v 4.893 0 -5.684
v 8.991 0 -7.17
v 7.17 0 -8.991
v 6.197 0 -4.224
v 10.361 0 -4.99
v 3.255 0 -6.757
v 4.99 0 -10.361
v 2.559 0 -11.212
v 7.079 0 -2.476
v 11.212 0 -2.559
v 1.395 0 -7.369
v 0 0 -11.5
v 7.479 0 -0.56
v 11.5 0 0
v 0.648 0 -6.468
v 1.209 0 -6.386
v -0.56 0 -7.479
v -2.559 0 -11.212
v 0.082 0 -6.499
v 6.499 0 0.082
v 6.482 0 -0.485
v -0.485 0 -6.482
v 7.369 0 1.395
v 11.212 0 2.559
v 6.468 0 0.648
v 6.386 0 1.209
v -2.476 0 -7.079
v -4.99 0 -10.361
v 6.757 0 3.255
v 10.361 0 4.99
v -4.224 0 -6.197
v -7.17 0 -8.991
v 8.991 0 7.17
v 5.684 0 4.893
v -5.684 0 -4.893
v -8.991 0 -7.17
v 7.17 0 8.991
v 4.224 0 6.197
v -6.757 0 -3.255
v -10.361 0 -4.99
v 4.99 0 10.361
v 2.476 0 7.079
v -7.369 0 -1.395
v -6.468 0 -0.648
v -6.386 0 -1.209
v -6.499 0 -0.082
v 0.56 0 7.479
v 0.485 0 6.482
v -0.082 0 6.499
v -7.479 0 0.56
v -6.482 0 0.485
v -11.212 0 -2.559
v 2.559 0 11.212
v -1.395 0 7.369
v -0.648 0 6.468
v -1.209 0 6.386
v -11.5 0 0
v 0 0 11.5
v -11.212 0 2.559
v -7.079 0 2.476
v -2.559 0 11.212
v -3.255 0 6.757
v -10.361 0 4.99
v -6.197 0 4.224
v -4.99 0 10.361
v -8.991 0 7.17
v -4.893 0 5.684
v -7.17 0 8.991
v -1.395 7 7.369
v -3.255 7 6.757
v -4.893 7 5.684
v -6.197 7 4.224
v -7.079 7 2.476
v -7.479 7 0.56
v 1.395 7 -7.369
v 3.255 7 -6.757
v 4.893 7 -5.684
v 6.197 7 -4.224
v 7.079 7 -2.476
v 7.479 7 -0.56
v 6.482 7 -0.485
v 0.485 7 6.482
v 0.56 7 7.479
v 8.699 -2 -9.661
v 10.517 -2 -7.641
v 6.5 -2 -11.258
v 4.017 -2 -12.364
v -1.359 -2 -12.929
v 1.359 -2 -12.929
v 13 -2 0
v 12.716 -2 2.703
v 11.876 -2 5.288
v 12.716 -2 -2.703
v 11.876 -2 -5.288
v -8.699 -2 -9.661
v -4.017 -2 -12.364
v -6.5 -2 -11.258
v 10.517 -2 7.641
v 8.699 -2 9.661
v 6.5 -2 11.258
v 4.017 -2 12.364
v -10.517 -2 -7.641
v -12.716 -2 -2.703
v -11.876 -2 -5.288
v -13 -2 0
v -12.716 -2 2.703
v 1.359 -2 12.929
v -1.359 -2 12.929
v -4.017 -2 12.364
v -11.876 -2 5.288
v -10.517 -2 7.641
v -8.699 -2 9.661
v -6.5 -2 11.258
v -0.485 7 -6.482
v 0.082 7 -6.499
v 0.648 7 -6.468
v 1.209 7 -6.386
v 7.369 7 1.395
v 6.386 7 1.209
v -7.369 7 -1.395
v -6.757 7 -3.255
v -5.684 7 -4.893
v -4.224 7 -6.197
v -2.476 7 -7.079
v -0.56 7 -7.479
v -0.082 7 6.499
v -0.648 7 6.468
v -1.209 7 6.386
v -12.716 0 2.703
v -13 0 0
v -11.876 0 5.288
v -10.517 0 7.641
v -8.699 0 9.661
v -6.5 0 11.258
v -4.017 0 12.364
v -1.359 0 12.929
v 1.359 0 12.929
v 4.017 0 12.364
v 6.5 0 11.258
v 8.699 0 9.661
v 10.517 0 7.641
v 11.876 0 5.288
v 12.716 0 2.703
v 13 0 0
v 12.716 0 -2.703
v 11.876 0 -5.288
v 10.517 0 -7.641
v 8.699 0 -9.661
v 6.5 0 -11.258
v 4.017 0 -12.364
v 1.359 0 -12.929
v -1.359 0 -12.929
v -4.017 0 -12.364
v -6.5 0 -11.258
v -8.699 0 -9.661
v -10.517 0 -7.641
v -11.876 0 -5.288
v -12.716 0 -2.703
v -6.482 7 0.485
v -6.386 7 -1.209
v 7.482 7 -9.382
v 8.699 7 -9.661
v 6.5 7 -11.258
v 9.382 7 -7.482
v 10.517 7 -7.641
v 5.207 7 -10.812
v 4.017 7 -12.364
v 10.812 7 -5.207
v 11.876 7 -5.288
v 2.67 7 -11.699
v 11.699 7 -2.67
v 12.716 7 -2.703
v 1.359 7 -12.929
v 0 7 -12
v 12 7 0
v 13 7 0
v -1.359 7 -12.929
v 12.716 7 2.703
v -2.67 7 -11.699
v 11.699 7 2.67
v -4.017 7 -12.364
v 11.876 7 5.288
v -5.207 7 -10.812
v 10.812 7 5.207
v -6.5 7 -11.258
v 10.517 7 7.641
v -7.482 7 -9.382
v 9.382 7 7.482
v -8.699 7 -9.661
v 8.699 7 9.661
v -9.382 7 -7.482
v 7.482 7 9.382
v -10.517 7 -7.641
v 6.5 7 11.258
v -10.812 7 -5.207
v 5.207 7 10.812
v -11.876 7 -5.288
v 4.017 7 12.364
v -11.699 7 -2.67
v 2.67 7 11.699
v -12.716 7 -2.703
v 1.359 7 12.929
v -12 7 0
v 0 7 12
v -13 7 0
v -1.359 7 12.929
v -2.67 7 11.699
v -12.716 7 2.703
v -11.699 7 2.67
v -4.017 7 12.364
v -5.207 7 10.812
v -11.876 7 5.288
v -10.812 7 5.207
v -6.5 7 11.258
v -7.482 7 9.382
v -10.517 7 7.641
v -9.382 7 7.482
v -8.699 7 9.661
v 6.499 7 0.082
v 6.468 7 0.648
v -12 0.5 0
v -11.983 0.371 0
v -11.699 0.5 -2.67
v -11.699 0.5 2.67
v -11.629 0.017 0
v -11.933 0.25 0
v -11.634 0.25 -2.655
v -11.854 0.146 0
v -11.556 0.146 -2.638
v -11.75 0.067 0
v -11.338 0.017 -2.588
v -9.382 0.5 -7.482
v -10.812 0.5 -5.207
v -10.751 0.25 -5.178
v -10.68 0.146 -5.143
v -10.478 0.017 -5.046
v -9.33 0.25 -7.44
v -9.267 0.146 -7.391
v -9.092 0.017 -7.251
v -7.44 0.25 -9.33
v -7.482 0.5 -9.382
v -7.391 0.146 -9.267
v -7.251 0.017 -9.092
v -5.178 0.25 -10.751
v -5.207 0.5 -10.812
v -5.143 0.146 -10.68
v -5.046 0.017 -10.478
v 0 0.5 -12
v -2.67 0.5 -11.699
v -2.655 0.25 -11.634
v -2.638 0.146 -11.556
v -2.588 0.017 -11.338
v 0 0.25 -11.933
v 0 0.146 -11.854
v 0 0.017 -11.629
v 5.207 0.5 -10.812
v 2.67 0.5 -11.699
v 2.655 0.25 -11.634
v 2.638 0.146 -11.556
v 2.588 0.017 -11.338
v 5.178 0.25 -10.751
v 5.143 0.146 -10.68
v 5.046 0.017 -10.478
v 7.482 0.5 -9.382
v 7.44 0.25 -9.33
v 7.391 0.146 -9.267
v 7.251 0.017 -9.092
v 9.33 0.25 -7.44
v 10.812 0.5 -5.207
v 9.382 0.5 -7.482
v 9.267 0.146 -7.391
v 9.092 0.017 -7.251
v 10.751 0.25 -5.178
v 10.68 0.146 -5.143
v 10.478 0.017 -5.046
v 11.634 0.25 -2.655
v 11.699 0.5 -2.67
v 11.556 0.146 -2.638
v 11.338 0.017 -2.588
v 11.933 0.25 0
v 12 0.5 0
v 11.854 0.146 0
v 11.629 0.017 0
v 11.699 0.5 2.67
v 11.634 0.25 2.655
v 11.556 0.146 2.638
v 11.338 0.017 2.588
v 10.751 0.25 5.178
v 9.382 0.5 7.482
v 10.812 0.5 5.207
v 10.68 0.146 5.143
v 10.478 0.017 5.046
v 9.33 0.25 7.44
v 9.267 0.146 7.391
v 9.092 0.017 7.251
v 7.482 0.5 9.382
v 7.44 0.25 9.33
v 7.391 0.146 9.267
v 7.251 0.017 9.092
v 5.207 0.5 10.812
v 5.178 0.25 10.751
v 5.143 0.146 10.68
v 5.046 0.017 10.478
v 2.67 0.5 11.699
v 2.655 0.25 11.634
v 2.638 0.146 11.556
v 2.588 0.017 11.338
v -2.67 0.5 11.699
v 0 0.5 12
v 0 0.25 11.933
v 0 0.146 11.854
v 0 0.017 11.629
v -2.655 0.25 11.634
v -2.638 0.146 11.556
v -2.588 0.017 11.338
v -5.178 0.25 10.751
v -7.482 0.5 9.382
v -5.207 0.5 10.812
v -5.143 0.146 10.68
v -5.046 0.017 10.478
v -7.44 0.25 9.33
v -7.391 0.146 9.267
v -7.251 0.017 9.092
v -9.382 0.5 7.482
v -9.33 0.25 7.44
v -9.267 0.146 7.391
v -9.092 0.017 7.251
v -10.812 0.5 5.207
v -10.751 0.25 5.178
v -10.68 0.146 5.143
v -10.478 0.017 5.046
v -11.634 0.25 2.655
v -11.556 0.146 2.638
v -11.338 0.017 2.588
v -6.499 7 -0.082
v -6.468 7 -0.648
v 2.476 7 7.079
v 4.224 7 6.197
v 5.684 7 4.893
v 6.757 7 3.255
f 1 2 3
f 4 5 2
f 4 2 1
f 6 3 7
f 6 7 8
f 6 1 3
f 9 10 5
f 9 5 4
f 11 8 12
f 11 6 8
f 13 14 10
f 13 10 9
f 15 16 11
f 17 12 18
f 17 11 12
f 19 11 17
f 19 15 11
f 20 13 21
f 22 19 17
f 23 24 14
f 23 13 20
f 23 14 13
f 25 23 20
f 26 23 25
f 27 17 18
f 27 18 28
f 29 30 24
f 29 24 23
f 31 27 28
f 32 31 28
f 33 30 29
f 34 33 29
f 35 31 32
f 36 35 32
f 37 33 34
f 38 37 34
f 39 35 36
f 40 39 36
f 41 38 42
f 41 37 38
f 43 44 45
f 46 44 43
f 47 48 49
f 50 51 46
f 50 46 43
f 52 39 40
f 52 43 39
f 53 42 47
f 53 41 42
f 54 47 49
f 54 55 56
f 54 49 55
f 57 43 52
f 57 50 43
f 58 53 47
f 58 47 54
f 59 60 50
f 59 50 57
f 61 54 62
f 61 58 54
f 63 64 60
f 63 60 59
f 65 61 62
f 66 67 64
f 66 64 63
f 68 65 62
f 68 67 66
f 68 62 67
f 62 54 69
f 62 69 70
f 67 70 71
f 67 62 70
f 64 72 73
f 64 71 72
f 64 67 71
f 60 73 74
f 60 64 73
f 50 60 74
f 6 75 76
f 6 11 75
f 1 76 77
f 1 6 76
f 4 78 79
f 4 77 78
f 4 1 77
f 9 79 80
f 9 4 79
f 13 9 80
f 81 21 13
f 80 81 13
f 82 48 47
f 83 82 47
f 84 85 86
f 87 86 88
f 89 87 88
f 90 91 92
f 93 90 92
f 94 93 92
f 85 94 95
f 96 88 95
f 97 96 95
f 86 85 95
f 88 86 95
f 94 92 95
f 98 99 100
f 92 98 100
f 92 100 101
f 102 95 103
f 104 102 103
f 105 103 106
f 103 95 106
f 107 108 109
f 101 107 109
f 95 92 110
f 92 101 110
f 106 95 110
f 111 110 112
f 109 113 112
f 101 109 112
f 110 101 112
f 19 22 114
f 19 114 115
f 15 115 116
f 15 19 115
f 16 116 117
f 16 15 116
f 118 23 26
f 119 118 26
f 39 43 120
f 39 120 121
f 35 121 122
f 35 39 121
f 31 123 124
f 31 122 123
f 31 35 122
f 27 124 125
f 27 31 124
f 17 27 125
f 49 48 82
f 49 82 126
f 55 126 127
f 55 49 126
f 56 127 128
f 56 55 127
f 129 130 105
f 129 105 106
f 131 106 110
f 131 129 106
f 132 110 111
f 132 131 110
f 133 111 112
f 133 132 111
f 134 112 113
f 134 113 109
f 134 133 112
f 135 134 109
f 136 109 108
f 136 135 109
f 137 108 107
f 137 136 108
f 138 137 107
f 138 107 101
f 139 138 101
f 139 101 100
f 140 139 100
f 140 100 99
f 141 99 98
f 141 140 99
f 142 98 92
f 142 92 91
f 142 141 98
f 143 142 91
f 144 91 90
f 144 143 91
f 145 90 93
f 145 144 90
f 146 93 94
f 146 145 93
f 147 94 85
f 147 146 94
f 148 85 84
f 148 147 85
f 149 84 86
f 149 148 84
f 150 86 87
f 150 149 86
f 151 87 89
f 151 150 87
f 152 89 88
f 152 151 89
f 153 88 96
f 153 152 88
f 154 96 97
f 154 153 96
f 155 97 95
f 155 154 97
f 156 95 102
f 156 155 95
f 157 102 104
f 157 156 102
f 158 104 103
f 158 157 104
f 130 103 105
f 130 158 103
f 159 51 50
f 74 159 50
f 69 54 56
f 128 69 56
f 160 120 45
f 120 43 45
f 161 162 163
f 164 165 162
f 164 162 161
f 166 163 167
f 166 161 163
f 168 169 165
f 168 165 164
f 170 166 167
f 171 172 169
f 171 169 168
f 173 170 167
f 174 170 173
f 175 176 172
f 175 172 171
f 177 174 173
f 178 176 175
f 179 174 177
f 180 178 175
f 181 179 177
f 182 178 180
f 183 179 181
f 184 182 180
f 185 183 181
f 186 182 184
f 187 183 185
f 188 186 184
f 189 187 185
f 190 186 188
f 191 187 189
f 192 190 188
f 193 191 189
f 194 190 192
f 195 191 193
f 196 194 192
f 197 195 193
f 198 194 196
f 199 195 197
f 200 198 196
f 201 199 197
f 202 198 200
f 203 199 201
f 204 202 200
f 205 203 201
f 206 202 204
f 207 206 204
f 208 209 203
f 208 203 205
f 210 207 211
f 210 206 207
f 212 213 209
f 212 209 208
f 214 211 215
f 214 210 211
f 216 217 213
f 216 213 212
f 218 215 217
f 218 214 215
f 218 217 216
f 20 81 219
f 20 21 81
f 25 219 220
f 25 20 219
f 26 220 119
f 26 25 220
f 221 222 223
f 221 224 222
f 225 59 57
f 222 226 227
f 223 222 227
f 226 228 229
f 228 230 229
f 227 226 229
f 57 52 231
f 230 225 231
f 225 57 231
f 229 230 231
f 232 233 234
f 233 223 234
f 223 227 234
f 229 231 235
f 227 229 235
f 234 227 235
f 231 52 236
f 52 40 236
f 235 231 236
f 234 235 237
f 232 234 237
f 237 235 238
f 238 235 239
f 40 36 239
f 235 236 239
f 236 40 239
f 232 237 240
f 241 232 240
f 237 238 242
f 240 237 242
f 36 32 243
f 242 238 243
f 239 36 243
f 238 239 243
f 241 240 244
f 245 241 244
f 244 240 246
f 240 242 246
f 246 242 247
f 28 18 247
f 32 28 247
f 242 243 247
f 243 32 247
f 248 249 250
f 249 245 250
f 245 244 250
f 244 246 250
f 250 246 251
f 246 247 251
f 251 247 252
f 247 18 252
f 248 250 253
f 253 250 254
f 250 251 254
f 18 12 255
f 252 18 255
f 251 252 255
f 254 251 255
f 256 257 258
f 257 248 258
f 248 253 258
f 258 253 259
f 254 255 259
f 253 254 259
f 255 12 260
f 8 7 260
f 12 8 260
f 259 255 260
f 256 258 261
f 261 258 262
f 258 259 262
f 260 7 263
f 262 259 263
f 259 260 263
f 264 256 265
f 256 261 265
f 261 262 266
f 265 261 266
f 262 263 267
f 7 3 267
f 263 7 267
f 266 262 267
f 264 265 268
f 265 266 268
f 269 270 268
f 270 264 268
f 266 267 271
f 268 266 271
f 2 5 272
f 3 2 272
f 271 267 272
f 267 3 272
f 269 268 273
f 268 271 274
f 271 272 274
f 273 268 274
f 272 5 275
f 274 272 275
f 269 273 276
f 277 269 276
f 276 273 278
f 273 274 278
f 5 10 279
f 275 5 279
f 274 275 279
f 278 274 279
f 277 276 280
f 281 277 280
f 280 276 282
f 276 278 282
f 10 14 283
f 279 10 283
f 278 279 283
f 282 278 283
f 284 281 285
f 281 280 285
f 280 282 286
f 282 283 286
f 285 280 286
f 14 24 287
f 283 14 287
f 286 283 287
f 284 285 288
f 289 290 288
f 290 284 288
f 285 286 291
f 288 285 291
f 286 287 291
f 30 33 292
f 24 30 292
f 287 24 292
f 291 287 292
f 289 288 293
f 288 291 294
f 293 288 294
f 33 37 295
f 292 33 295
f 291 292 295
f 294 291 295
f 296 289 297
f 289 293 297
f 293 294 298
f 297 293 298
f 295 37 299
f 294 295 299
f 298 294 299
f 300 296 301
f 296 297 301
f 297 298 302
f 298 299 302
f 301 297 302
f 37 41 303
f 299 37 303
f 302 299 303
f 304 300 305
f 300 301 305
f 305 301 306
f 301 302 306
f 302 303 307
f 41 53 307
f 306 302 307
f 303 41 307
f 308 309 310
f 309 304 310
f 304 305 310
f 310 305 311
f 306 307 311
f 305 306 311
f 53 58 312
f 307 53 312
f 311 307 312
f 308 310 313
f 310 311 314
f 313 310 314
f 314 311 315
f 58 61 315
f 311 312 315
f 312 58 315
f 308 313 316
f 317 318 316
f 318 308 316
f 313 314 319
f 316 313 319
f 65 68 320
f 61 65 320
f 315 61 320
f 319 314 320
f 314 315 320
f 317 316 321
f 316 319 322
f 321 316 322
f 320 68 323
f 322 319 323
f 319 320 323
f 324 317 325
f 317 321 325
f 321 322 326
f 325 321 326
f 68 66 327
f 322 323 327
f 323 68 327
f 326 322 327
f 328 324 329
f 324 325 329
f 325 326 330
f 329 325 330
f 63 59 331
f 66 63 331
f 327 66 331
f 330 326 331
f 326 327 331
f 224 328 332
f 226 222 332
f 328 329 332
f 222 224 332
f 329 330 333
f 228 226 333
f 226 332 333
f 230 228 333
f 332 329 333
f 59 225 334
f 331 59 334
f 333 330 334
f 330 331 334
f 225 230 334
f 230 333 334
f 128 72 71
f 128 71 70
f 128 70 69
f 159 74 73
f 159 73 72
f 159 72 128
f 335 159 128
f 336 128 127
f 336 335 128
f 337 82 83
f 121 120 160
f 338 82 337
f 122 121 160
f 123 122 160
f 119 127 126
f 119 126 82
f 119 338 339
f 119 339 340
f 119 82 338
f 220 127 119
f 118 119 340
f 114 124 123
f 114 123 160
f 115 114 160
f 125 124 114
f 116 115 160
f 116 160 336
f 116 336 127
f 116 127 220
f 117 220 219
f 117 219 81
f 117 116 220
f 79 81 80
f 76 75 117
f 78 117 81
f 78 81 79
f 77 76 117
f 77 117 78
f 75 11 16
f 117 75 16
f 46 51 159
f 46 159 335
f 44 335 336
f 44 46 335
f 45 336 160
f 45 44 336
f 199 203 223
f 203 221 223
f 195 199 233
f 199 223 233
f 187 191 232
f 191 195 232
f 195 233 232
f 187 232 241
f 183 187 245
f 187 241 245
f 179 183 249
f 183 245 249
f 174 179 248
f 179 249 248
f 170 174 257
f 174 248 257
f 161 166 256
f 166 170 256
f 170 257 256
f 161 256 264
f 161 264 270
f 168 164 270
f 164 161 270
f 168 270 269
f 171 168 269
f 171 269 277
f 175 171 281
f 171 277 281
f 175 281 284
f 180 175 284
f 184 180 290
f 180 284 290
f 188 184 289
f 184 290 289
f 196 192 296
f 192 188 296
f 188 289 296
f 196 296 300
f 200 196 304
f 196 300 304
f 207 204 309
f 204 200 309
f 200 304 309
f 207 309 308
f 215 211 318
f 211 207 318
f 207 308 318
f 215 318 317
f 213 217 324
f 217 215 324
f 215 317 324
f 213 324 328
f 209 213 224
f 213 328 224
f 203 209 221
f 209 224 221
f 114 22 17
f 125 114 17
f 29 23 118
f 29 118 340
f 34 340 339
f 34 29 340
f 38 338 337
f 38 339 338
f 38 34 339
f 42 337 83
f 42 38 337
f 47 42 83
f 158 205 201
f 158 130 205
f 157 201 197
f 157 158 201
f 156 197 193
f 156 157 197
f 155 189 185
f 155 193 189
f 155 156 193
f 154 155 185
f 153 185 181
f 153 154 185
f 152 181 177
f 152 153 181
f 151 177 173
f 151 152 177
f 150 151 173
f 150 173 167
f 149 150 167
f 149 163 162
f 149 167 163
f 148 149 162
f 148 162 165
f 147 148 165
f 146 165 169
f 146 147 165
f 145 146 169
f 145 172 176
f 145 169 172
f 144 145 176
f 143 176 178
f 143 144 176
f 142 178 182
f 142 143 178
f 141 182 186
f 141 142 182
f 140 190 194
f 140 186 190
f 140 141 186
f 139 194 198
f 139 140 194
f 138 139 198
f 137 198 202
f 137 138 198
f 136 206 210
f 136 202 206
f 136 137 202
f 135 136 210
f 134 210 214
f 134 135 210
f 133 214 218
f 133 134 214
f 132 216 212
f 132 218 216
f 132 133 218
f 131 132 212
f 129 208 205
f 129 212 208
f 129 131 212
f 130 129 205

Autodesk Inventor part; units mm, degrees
ref_plane "YZ Plane" through (0, 0, 0) normal (1, 0, 0) x (0, 1, 0)
ref_plane "XZ Plane" through (0, 0, 0) normal (0, 1, 0) x (-1, 0, 0)
ref_plane "XY Plane" through (0, 0, 0) normal (0, 0, 1) x (1, 0, 0)
sketch "Szkic1" plane through (0, 0, 0) normal (0, 1, 0) x (-1, 0, 0)
  circle A0 centre (0, 0) radius 12
  circle A1 centre (0, 0) radius 13
  dimension "d0" = 24
  dimension "d1" = 1
extrude "Wyciągnięcie proste1" add sketch "Szkic1" along normal blind 7
extrude "Wyciągnięcie proste2" add sketch "Szkic1" against normal blind 2 contours A0 | A1
sketch "Szkic2" plane through (0, 0, 0) normal (0, 1, 0) x (1, 0, 0)
  circle A0 centre (0, 0) radius 12 projected
  circle A1 centre (0, 0) radius 1.5
  line L0 (-1.3953, -7.3691) -> (-1.2093, -6.3865)
  arc A2 (-1.2093, -6.3865) -> (0.4849, -6.4819) centre (0, 0) ccw
  line L1 (0.4849, -6.4819) -> (0.5595, -7.4791)
  arc A3 (0.5595, -7.4791) -> (7.3691, -1.3953) centre (0, 0) ccw
  line L2 (7.3691, -1.3953) -> (6.3865, -1.2093)
  arc A4 (6.3865, -1.2093) -> (6.4819, 0.4849) centre (0, 0) ccw
  line L3 (6.4819, 0.4849) -> (7.4791, 0.5595)
  arc A5 (7.4791, 0.5595) -> (1.3953, 7.3691) centre (0, 0) ccw
  line L4 (1.3953, 7.3691) -> (1.2093, 6.3865)
  arc A6 (1.2093, 6.3865) -> (-0.4849, 6.4819) centre (0, 0) ccw
  line L5 (-0.4849, 6.4819) -> (-0.5595, 7.4791)
  arc A7 (-0.5595, 7.4791) -> (-7.3691, 1.3953) centre (0, 0) ccw
  line L6 (-7.3691, 1.3953) -> (-6.3865, 1.2093)
  arc A8 (-6.3865, 1.2093) -> (-6.4819, -0.4849) centre (0, 0) ccw
  line L7 (-6.4819, -0.4849) -> (-7.4791, -0.5595)
  arc A9 (-7.4791, -0.5595) -> (-1.3953, -7.3691) centre (0, 0) ccw
  point P0 (10.4507, -2.3919)
extrude "Wyciągnięcie proste3" add sketch "Szkic2" along normal blind 7 contours A1 | A9 L7 A8 L6 A7 L5 A6 L4 A5 L3 A4 L2 A3 L1 A2 L0
fillet "Zaokrąglenie1" radius 0.5 1 edges at (12, 0, 0)
properties part number "forma"
